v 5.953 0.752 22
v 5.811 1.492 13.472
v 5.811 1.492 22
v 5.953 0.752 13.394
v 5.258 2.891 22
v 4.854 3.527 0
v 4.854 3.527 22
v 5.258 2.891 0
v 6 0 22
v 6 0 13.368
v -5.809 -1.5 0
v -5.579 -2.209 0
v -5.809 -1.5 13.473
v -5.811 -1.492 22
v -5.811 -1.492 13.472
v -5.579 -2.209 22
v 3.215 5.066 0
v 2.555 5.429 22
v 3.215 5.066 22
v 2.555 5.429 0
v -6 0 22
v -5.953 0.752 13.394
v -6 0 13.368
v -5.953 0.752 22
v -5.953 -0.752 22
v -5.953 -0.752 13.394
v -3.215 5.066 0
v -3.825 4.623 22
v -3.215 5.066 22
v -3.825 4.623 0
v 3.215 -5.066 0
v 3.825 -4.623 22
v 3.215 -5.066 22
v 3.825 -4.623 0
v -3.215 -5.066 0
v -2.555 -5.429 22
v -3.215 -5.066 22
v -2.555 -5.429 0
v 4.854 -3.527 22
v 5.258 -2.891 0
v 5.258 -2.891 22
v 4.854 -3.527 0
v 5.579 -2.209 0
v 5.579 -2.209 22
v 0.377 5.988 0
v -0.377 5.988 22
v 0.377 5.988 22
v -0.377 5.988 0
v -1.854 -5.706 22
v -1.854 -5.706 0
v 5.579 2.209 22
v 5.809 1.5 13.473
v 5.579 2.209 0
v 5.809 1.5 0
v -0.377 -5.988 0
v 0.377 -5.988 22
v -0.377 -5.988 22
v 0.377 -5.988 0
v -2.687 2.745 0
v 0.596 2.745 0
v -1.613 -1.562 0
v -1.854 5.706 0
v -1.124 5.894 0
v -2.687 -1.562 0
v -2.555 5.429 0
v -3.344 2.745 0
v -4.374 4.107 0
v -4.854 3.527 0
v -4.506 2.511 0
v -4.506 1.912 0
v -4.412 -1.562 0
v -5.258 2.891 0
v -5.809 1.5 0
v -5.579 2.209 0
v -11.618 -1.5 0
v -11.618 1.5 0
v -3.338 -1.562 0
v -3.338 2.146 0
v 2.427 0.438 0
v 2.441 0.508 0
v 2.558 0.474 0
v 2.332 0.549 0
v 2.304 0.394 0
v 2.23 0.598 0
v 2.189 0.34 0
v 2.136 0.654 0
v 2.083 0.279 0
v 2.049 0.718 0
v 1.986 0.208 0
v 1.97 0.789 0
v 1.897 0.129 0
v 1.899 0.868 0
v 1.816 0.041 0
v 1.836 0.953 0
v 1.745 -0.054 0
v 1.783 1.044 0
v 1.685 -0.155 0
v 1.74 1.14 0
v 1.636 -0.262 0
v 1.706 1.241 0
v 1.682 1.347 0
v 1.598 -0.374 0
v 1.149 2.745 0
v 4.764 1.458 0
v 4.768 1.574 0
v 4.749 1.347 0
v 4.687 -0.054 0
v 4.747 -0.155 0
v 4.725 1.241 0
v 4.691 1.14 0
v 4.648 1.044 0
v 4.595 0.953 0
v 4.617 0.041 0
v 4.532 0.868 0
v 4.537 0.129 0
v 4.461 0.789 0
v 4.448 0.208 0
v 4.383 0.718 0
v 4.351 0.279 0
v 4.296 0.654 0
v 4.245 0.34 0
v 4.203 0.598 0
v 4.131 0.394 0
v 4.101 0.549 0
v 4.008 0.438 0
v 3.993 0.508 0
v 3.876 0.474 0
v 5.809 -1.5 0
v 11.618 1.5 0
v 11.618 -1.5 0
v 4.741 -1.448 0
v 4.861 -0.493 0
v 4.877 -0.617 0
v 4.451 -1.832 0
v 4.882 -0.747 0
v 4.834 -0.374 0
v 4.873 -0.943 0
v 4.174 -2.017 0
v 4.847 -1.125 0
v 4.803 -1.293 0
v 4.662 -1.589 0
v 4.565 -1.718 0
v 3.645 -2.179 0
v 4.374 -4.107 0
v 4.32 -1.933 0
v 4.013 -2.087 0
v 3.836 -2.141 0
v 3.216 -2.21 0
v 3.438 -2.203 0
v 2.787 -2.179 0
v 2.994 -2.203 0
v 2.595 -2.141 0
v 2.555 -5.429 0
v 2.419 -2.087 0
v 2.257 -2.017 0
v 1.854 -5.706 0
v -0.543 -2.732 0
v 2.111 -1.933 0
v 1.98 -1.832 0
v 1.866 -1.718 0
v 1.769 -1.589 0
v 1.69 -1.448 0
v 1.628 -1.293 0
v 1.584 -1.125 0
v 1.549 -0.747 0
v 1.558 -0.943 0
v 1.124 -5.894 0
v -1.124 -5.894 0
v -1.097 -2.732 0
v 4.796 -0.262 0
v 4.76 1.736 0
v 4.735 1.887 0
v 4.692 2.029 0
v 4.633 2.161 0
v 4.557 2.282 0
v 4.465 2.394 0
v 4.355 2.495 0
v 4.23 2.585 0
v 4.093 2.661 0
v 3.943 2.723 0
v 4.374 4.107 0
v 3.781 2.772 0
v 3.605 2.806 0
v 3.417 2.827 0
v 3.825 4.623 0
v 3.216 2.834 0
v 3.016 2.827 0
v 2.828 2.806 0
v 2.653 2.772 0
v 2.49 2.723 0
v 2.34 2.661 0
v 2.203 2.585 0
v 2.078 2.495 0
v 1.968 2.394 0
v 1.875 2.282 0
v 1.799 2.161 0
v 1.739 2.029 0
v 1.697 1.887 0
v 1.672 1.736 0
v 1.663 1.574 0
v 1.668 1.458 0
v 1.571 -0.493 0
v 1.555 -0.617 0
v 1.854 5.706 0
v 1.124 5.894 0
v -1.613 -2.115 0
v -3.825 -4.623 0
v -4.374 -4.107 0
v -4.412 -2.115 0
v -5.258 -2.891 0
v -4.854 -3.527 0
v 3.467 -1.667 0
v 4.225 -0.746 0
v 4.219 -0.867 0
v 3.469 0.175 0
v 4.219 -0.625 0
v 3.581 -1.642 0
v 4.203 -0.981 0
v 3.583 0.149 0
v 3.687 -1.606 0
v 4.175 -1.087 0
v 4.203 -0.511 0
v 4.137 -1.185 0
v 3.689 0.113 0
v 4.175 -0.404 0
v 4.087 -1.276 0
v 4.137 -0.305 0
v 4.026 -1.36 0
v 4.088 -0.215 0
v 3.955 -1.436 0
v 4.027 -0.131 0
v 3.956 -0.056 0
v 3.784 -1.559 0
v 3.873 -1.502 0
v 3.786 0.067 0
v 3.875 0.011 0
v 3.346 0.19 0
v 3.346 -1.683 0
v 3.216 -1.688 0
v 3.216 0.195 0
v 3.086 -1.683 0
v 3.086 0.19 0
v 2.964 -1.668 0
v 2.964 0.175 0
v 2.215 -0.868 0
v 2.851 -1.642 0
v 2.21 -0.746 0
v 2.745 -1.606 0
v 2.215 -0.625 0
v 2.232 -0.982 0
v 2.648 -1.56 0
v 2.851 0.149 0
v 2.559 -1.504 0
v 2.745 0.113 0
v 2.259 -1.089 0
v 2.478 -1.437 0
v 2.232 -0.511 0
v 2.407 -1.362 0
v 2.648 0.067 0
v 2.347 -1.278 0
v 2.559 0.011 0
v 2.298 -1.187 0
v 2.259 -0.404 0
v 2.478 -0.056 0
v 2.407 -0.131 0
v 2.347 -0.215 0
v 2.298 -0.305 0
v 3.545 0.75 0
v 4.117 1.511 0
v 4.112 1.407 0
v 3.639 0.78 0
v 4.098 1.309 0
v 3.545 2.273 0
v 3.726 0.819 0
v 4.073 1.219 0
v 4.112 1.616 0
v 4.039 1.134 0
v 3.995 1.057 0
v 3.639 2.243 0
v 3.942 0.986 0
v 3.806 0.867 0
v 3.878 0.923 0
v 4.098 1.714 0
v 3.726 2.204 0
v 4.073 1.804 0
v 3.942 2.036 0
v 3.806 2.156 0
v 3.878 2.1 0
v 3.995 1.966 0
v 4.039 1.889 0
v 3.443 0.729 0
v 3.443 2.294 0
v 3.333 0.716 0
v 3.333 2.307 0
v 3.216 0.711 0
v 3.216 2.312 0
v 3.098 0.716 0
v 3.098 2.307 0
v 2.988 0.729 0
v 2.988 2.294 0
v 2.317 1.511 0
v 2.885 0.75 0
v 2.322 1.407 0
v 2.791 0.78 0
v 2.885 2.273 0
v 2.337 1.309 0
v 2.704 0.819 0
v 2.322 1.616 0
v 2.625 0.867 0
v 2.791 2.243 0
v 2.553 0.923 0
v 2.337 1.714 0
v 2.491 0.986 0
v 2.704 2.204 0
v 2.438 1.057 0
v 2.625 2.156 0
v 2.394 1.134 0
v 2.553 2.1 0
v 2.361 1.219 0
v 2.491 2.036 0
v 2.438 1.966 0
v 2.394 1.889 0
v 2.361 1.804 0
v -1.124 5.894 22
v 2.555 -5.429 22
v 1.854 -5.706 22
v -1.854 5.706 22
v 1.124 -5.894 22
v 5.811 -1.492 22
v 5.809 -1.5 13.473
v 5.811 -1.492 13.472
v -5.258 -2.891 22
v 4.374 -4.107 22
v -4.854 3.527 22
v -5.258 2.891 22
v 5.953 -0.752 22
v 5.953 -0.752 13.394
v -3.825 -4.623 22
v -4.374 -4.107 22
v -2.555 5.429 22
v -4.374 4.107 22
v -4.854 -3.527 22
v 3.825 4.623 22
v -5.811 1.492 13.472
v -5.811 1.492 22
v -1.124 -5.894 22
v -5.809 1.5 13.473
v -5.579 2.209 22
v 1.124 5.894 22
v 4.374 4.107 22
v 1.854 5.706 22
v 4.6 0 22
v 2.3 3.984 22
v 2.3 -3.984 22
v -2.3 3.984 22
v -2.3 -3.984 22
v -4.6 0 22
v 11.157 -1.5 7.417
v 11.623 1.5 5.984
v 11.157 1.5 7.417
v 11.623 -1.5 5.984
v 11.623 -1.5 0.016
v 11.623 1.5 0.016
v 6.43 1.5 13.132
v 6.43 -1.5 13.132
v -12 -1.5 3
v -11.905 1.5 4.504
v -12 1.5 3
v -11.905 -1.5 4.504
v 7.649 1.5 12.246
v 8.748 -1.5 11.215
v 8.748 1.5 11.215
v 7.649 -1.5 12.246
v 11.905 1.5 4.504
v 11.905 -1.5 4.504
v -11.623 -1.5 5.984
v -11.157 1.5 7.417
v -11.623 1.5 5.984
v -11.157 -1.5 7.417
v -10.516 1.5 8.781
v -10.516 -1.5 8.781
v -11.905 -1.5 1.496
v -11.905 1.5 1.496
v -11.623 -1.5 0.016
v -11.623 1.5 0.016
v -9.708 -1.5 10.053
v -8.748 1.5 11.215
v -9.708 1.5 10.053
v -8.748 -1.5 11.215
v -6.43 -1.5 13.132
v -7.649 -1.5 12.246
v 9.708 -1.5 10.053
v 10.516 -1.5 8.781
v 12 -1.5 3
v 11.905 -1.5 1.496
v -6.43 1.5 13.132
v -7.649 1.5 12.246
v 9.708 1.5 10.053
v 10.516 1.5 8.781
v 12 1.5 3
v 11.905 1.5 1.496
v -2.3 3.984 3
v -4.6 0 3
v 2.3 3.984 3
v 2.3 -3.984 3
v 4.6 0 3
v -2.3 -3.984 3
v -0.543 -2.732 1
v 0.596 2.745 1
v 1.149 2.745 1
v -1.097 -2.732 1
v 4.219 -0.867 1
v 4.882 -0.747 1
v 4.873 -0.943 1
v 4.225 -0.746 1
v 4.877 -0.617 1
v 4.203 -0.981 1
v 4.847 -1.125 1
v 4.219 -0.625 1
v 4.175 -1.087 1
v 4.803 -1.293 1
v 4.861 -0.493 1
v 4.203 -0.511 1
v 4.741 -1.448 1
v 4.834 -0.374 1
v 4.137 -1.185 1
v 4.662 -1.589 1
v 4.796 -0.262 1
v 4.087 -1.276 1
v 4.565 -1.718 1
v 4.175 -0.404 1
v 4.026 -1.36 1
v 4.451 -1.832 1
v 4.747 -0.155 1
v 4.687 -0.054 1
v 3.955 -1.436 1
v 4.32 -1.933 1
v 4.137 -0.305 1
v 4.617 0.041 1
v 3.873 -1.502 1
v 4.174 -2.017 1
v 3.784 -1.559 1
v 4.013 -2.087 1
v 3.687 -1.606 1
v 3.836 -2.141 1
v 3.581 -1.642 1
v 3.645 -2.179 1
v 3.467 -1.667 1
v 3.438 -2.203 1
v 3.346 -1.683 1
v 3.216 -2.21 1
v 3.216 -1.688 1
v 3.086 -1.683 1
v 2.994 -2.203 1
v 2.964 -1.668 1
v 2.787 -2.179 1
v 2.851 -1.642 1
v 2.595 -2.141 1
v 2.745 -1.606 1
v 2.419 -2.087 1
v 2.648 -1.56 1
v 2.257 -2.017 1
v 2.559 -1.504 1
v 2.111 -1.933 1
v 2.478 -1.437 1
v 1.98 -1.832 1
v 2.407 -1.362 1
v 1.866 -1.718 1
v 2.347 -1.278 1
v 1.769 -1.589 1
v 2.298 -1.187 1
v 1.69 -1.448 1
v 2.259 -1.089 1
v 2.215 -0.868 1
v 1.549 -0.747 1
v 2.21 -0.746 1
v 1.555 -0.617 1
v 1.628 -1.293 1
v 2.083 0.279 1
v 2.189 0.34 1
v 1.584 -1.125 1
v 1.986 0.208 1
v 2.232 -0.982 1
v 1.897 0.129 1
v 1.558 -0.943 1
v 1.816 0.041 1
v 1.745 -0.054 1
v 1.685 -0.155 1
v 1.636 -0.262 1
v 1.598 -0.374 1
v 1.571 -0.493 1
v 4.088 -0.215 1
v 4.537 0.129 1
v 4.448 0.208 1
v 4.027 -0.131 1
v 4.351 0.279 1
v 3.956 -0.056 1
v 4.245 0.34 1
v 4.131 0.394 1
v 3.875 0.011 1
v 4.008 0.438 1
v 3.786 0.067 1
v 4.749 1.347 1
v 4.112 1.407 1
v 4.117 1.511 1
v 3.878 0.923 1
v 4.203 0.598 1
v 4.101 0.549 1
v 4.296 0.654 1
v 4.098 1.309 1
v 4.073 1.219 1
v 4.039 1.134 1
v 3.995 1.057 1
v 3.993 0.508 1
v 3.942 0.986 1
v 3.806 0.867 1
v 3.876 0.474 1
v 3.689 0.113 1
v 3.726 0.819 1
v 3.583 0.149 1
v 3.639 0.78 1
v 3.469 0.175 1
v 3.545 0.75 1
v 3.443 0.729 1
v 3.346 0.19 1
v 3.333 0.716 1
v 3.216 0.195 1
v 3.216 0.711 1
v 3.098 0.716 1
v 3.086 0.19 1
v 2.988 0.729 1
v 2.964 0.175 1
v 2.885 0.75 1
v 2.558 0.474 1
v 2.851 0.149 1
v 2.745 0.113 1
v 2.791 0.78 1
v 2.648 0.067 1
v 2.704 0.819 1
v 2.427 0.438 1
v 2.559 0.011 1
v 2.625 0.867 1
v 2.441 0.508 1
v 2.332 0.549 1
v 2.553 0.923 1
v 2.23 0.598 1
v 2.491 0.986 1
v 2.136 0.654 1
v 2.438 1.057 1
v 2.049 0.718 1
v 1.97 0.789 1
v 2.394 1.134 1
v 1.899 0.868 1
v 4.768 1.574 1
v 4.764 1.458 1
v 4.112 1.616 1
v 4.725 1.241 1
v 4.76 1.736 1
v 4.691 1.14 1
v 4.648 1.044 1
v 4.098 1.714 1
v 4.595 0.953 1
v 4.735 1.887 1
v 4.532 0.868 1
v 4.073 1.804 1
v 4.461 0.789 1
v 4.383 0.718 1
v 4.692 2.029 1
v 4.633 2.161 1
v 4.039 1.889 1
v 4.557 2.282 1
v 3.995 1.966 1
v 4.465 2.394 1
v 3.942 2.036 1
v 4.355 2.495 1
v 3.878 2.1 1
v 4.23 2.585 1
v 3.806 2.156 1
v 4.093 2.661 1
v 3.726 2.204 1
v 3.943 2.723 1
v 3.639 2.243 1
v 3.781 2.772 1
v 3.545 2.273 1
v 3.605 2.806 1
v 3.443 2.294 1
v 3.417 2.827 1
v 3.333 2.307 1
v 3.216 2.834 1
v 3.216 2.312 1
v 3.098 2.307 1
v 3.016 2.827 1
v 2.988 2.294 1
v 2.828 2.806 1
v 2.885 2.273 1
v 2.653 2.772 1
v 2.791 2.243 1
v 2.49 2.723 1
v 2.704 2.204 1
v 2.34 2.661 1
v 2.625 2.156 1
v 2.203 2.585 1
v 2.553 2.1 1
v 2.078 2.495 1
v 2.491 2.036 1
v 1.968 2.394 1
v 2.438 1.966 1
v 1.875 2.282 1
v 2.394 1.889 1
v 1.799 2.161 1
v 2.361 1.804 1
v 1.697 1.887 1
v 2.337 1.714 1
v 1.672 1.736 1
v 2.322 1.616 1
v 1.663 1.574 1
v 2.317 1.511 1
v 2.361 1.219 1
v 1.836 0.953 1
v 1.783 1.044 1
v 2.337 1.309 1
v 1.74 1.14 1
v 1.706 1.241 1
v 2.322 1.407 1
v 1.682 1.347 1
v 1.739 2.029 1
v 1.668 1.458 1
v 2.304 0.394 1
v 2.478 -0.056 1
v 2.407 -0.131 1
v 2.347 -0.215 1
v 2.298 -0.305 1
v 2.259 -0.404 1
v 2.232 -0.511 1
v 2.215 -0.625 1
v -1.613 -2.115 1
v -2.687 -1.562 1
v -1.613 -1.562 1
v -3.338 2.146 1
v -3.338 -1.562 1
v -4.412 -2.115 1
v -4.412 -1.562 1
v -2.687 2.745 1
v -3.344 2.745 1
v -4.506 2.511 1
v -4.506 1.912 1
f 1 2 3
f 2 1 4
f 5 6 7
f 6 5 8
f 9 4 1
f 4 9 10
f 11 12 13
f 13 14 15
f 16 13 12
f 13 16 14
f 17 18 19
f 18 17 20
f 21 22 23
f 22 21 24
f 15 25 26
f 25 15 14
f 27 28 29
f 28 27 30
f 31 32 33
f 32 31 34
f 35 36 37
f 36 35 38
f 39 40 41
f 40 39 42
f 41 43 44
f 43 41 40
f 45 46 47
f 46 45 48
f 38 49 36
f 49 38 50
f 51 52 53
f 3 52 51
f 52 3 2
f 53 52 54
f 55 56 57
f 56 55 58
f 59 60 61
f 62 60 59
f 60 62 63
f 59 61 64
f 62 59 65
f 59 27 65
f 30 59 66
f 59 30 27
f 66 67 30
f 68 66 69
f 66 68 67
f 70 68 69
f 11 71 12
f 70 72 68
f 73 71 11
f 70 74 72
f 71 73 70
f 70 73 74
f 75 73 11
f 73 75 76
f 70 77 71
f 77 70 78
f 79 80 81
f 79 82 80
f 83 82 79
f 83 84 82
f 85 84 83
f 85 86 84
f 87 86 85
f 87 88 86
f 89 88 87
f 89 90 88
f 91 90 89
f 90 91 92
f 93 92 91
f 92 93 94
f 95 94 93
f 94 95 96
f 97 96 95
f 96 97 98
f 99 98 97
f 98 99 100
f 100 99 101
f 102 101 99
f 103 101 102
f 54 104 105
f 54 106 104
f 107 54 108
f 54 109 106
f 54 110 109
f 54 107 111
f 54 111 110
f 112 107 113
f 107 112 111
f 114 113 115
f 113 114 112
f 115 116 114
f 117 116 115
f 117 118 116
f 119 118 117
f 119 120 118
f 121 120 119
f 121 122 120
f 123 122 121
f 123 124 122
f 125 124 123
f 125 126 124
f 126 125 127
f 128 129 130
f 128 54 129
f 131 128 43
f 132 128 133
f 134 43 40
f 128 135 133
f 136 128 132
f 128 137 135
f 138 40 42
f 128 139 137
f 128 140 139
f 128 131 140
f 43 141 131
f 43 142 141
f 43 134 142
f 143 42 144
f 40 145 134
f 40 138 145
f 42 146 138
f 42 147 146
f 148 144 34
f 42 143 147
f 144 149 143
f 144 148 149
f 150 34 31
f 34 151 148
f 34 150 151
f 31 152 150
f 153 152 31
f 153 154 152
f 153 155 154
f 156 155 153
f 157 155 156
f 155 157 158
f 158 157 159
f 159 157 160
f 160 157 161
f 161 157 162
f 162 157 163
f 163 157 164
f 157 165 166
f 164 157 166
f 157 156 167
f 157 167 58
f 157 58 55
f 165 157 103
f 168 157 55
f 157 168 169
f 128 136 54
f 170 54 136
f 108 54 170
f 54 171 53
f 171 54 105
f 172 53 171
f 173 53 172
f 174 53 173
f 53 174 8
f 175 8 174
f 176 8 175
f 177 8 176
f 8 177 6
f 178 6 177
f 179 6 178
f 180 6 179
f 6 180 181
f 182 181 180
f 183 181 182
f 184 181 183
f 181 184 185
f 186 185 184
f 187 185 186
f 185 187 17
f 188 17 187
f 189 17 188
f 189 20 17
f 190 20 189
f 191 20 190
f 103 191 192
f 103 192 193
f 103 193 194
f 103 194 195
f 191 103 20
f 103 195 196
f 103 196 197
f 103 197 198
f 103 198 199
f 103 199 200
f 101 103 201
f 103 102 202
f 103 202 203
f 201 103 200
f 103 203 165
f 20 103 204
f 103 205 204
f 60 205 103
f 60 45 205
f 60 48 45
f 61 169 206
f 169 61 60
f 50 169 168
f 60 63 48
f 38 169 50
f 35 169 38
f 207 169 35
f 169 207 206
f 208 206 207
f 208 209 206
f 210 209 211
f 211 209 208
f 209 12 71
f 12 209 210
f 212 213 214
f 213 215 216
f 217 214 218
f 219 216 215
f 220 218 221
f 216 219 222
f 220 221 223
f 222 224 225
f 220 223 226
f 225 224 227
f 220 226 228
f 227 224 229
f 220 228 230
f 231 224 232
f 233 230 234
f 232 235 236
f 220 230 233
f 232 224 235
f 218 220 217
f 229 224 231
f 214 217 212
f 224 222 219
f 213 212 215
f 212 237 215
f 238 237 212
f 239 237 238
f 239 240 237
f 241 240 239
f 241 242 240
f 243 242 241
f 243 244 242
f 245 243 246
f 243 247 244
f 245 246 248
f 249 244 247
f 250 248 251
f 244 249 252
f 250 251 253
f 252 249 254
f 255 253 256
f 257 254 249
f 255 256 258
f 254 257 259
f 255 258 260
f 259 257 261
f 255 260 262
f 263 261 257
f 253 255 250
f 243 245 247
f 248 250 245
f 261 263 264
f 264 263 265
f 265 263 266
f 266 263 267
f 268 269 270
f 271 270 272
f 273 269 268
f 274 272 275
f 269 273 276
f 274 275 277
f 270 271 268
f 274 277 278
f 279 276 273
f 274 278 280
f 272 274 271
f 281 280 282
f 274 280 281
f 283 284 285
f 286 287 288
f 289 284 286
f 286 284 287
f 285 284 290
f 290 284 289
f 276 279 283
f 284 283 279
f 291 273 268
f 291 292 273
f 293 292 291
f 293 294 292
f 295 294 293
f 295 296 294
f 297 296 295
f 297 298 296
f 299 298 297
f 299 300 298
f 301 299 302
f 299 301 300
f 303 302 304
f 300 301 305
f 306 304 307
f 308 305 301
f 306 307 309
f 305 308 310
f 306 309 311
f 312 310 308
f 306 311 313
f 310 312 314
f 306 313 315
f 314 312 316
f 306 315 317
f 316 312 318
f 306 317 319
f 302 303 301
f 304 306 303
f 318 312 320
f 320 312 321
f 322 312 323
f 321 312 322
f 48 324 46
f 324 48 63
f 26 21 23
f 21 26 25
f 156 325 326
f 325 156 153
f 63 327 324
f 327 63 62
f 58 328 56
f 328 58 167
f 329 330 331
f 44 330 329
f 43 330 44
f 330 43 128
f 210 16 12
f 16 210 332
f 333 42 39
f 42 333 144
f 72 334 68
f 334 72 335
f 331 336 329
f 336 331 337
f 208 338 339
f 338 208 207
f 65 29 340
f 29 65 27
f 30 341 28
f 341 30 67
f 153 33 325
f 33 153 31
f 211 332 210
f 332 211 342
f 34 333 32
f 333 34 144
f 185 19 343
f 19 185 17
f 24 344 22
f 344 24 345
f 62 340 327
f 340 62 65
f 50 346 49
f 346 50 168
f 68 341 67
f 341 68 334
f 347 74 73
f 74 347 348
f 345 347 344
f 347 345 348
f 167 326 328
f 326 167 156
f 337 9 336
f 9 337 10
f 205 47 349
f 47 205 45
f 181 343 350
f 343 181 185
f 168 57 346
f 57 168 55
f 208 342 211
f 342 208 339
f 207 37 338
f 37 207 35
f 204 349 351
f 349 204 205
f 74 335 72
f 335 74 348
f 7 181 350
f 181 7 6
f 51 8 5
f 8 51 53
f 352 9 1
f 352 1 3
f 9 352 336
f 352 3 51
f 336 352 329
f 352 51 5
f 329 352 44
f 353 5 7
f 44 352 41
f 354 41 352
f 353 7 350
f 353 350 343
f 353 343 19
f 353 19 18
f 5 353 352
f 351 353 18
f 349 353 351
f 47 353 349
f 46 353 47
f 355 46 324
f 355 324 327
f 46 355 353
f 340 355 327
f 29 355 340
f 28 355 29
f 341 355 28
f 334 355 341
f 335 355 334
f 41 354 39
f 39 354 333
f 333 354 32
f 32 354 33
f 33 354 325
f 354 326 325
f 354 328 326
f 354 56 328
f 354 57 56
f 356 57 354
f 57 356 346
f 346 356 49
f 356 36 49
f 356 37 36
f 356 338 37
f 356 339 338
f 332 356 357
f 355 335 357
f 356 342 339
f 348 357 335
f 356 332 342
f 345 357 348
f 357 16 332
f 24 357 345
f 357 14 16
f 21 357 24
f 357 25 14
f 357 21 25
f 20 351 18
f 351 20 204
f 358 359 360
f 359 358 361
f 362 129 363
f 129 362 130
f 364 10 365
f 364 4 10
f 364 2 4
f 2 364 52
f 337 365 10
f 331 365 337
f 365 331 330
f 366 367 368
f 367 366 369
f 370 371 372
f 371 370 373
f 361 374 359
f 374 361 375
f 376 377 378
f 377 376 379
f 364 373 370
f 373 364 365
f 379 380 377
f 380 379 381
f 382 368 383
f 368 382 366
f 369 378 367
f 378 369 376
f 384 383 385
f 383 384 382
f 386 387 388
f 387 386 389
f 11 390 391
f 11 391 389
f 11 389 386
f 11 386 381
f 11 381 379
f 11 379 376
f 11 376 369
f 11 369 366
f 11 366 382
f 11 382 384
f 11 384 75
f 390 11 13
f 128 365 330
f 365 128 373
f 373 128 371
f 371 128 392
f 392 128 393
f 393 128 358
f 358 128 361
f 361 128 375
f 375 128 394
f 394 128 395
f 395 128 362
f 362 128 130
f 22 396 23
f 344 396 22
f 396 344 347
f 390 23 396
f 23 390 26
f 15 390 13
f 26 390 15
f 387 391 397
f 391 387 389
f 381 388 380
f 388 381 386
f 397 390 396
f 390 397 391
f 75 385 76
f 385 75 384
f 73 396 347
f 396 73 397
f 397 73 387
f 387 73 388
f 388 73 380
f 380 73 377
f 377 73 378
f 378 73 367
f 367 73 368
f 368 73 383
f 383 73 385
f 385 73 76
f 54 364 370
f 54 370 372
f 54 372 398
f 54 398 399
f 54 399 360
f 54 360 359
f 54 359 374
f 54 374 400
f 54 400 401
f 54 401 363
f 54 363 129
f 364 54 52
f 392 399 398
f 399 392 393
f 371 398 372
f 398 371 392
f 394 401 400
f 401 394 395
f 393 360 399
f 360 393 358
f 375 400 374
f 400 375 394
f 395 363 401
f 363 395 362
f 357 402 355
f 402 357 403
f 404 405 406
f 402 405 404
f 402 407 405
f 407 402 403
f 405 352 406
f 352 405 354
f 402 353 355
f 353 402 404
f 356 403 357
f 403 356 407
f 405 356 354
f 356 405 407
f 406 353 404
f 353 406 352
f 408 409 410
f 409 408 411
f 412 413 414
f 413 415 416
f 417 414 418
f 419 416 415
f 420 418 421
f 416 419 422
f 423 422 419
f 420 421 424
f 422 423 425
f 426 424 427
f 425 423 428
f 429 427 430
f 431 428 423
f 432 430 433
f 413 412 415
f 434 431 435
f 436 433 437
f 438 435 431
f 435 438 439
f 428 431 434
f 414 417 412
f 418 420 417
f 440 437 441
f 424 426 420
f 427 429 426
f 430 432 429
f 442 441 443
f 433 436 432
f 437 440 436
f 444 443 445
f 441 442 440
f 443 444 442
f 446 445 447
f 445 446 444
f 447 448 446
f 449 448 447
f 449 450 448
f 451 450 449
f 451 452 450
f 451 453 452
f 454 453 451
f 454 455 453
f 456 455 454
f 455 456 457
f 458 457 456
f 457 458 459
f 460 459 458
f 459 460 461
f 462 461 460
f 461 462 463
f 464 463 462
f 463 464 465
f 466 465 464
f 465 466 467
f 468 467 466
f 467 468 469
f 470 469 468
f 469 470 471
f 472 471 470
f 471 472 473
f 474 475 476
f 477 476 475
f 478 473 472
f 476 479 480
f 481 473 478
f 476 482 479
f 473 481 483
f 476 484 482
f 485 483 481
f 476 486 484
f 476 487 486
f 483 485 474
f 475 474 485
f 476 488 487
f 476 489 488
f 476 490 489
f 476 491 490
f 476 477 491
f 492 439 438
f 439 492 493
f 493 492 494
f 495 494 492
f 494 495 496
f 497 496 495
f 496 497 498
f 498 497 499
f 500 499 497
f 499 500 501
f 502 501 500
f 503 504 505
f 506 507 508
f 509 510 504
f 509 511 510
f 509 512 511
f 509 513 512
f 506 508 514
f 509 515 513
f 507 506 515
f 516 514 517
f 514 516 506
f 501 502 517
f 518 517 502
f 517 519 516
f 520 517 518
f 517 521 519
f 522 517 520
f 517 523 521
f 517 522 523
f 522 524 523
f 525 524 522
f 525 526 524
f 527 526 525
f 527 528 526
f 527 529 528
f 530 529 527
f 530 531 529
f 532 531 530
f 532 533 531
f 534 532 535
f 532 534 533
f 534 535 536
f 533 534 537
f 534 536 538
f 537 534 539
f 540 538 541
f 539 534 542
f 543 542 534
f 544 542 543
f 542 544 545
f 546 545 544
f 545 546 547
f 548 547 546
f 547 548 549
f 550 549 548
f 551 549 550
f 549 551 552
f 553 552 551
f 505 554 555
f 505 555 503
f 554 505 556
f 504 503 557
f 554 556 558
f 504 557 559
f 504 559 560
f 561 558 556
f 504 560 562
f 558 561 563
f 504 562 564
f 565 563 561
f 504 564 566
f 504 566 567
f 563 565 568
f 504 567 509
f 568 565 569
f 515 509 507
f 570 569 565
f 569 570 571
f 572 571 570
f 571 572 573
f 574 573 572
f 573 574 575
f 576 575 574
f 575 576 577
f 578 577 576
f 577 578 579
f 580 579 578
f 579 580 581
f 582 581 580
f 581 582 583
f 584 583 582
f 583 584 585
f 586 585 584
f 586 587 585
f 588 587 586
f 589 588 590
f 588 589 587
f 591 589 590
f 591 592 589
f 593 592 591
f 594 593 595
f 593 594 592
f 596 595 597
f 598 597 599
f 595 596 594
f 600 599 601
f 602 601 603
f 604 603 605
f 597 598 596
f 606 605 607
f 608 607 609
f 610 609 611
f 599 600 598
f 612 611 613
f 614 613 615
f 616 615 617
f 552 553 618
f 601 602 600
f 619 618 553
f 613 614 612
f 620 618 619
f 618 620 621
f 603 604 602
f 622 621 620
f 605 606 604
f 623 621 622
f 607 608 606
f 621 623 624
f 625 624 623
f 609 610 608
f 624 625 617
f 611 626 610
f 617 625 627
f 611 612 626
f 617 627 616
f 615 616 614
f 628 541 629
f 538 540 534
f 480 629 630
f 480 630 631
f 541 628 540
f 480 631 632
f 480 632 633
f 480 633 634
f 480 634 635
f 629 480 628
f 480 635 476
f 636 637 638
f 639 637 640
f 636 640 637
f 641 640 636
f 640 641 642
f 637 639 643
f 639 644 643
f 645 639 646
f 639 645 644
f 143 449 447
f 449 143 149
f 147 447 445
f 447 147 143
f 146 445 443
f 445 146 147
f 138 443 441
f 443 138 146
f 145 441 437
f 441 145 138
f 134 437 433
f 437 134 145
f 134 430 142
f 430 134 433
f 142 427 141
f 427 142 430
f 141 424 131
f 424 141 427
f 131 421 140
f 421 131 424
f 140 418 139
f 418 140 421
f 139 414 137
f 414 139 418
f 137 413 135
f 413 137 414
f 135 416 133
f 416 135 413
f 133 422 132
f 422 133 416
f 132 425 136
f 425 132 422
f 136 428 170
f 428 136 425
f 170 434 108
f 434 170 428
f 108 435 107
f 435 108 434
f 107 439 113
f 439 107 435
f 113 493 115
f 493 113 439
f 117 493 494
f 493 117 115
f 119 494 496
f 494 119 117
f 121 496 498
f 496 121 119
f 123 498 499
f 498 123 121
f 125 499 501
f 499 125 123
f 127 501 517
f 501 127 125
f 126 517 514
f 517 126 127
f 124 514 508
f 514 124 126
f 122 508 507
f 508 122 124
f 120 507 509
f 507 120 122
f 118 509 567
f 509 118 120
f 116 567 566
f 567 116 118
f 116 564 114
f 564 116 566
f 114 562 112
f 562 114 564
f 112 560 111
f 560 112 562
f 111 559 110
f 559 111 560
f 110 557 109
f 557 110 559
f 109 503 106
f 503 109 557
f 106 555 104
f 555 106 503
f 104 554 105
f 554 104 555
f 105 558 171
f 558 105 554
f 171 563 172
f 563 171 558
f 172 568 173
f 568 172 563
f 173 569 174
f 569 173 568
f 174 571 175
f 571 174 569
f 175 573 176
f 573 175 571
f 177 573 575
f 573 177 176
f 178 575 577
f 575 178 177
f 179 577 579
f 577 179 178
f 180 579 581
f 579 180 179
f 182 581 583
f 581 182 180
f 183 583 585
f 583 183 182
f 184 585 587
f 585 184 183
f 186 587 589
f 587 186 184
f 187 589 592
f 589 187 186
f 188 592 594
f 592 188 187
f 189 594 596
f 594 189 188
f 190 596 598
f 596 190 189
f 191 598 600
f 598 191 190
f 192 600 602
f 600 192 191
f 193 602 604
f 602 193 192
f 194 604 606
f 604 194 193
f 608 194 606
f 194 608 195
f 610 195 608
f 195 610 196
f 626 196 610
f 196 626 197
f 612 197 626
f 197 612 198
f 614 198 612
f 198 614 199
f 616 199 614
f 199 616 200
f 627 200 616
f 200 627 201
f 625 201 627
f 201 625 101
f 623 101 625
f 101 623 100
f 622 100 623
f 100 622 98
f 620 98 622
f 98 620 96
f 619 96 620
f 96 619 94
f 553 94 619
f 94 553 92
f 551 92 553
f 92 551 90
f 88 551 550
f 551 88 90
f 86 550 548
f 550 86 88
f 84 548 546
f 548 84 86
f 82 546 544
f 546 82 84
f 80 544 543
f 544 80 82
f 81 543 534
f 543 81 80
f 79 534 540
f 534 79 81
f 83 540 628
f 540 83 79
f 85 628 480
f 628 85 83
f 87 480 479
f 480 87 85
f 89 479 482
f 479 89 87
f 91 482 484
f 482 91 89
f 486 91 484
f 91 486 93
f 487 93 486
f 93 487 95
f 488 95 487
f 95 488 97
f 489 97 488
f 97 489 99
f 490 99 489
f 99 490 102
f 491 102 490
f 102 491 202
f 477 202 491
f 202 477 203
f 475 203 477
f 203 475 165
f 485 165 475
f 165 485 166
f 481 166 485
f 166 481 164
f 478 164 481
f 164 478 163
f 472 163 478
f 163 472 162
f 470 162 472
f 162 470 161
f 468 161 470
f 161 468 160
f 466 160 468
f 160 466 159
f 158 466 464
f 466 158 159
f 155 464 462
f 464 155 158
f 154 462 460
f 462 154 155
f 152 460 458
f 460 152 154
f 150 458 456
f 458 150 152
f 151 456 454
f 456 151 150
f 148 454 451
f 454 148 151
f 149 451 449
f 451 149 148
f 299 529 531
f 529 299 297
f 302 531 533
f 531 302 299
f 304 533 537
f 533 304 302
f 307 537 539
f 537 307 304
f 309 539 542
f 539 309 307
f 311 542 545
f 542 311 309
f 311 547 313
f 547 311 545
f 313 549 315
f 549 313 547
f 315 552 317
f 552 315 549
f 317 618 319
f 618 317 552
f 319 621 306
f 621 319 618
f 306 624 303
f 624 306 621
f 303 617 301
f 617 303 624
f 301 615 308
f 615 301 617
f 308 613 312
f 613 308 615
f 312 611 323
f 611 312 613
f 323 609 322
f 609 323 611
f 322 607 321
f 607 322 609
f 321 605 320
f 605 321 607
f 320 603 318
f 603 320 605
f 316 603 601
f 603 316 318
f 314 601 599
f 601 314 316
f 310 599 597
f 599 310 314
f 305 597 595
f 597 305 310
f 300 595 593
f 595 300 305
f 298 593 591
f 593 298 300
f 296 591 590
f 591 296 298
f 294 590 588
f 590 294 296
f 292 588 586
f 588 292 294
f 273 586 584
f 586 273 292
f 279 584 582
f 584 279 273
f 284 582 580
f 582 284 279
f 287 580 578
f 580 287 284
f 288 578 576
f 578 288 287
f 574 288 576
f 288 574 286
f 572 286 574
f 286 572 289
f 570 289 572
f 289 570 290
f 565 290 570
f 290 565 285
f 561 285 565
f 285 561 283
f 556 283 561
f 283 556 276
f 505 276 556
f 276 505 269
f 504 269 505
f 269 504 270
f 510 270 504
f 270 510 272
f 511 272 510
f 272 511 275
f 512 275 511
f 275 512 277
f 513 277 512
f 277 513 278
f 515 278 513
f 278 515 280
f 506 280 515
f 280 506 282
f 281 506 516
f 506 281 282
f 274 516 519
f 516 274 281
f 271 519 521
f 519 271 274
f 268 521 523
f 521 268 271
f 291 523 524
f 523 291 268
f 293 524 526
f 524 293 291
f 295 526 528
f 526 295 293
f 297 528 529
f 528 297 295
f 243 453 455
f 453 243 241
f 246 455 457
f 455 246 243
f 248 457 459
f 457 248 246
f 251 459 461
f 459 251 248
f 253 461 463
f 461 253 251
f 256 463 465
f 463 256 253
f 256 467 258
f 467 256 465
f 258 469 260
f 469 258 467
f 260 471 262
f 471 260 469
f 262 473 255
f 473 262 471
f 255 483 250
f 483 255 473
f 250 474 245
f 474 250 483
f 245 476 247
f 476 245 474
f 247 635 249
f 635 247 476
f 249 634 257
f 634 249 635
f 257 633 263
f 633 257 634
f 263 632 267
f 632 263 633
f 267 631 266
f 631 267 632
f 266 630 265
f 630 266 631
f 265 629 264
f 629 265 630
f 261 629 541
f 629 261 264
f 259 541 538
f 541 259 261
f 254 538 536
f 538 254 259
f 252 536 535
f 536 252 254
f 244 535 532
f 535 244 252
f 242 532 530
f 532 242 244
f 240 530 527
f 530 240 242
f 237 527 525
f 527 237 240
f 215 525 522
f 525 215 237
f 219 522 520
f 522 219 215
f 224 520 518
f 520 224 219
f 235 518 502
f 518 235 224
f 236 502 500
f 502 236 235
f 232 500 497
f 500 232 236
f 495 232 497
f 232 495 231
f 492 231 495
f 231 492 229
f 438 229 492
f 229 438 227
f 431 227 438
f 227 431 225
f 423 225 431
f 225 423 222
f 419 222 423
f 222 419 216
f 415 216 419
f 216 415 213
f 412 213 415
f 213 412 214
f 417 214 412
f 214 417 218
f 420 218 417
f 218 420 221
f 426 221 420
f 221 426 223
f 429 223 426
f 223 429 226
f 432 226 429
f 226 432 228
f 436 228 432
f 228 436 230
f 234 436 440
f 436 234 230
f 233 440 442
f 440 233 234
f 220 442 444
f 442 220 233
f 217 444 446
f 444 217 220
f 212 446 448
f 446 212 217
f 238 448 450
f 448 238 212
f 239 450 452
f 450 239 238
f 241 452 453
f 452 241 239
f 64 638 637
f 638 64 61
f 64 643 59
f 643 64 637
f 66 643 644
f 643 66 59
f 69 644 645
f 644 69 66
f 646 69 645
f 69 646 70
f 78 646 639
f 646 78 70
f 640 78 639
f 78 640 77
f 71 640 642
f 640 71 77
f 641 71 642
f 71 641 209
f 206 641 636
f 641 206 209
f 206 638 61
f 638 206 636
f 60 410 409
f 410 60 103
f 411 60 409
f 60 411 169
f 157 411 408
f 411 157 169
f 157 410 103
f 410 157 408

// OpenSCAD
$fn = 50;
nut_diameter=9.2;
outer_diameter=12;
height = 22;
fin_width = outer_diameter + 12;
fin_thickness = 3;
fin_offset = 3;



difference() {
    union() {
        linear_extrude(height) {
            circle(d=outer_diameter);
        }
        rotate([90, 0, 0]){
            translate([0, fin_offset, -fin_thickness / 2]){
                linear_extrude(fin_thickness) {
                    difference() {
                        circle(d=fin_width);
                        translate([0, -fin_width / 2 - fin_offset, 0]){
                            square([fin_width, fin_width], true);
                        }
                    }
                }
            }
        }
    }
    translate([0, 0, 3]) {
        linear_extrude(height * 100) {
            circle(d=nut_diameter, $fn=6);
        }
    }
    translate([0, 0, -1]){
        linear_extrude(2) {
            text("1/8", size=outer_diameter * 0.4, font="Nunito Extra Bold", halign="center", valign="center");
        }
    }
}
